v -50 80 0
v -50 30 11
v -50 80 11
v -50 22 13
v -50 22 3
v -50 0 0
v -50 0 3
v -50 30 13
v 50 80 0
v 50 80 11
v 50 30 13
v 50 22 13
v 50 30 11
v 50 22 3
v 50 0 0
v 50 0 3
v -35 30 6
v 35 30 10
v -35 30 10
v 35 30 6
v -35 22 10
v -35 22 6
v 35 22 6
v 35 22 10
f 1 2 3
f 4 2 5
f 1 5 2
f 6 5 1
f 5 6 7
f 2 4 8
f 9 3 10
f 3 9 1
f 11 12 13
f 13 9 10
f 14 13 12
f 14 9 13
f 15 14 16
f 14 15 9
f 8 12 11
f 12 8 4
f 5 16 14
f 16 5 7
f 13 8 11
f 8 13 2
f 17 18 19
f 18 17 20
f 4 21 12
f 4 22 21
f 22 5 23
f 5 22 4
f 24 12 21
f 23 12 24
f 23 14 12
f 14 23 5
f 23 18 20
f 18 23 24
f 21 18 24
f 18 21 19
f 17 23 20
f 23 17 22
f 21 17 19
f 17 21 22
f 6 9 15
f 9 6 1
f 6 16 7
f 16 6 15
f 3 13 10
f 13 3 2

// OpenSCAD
// ==============================================
// Global Configuration
// ==============================================
$fn = 64; // Smooth resolution for curved features

// ==============================================
// Core Parametric Dimensions (all units in mm)
// ==============================================
// Base Slab Parameters
base_width = 100;       // Total width of base (X axis)
base_depth = 80;        // Total depth of base (Y axis: front=0, back=base_depth)
base_thickness = 3;     // Thickness of base slab (Z axis)

// Rear Raised Block Parameters
rear_raise_depth = 50;  // Depth of rear raised section
rear_raise_height = 8;  // Height of rear section above base

// Side Edge Strip Parameters
side_strip_width = 6;   // Width of left/right raised strips
side_strip_height = 6;  // Height of side strips above base (shallow step)

// Transverse Cross Feature (with internal opening) Parameters
trans_thickness = 8;    // Thickness of cross feature along Y axis
trans_height = 10;      // Total height of cross feature above base
open_width = 70;        // Width of internal through opening
open_height = 4;        // Height of internal through opening

// Forward Continuation Feature Parameters
cont_width = 40;        // Width of forward protruding continuation
cont_depth = 25;        // Depth continuation extends forward from rear shoulder
cont_height = 4;        // Height of continuation feature
cont_z_offset = 2;      // Gap between continuation bottom and base (creates non-flat underside)

// ==============================================
// Reusable Module Definitions
// ==============================================
module base_slab(w, d, t) {
    // Thin flat base slab, origin centered on X axis, front at Y=0
    translate([-w/2, 0, 0])
        cube([w, d, t]);
}

module rear_raised_block(base_w, rear_d, rear_h, base_t, base_d) {
    // Larger raised section occupying rear of base
    translate([-base_w/2, base_d - rear_d, base_t])
        cube([base_w, rear_d, rear_h]);
}

module side_edge_strips(base_w, rear_d, strip_w, strip_h, base_t, base_d) {
    // Narrow raised strips along left/right edges of rear raised section
    union() {
        // Left strip
        translate([-base_w/2, base_d - rear_d, base_t])
            cube([strip_w, rear_d, strip_h]);
        // Right strip
        translate([base_w/2 - strip_w, base_d - rear_d, base_t])
            cube([strip_w, rear_d, strip_h]);
    }
}

module transverse_cross_feature(base_w, t_thick, t_h, o_w, o_h, base_t, rear_d, base_d) {
    // Spanning cross feature with internal through opening
    translate([-base_w/2, base_d - rear_d - t_thick, base_t])
    difference() {
        // Main cross bar
        cube([base_w, t_thick, t_h]);
        // Internal opening (cuts all the way through feature)
        translate([(base_w - o_w)/2, 0, (t_h - o_h)/2])
            cube([o_w, t_thick, o_h]);
    }
}

module forward_continuation(c_w, c_d, c_h, z_off, base_t, rear_d, base_d) {
    // Shallow protruding feature extending forward from rear shoulder
    translate([-c_w/2, base_d - rear_d, base_t + z_off])
        cube([c_w, c_d, c_h]);
}

// ==============================================
// Main Model Assembly (all features added as solid material)
// ==============================================
union() {
    // Base foundation
    base_slab(base_width, base_depth, base_thickness);
    
    // Rear raised main block
    rear_raised_block(base_width, rear_raise_depth, rear_raise_height, base_thickness, base_depth);
    
    // Side edge strips
    side_edge_strips(base_width, rear_raise_depth, side_strip_width, side_strip_height, base_thickness, base_depth);
    
    // Cross spanning feature with internal opening
    transverse_cross_feature(base_width, trans_thickness, trans_height, open_width, open_height, base_thickness, rear_raise_depth, base_depth);
    
    // Forward aligned continuation (creates stepped height and non-flat underside)
    forward_continuation(cont_width, cont_depth, cont_height, cont_z_offset, base_thickness, rear_raise_depth, base_depth);
}
